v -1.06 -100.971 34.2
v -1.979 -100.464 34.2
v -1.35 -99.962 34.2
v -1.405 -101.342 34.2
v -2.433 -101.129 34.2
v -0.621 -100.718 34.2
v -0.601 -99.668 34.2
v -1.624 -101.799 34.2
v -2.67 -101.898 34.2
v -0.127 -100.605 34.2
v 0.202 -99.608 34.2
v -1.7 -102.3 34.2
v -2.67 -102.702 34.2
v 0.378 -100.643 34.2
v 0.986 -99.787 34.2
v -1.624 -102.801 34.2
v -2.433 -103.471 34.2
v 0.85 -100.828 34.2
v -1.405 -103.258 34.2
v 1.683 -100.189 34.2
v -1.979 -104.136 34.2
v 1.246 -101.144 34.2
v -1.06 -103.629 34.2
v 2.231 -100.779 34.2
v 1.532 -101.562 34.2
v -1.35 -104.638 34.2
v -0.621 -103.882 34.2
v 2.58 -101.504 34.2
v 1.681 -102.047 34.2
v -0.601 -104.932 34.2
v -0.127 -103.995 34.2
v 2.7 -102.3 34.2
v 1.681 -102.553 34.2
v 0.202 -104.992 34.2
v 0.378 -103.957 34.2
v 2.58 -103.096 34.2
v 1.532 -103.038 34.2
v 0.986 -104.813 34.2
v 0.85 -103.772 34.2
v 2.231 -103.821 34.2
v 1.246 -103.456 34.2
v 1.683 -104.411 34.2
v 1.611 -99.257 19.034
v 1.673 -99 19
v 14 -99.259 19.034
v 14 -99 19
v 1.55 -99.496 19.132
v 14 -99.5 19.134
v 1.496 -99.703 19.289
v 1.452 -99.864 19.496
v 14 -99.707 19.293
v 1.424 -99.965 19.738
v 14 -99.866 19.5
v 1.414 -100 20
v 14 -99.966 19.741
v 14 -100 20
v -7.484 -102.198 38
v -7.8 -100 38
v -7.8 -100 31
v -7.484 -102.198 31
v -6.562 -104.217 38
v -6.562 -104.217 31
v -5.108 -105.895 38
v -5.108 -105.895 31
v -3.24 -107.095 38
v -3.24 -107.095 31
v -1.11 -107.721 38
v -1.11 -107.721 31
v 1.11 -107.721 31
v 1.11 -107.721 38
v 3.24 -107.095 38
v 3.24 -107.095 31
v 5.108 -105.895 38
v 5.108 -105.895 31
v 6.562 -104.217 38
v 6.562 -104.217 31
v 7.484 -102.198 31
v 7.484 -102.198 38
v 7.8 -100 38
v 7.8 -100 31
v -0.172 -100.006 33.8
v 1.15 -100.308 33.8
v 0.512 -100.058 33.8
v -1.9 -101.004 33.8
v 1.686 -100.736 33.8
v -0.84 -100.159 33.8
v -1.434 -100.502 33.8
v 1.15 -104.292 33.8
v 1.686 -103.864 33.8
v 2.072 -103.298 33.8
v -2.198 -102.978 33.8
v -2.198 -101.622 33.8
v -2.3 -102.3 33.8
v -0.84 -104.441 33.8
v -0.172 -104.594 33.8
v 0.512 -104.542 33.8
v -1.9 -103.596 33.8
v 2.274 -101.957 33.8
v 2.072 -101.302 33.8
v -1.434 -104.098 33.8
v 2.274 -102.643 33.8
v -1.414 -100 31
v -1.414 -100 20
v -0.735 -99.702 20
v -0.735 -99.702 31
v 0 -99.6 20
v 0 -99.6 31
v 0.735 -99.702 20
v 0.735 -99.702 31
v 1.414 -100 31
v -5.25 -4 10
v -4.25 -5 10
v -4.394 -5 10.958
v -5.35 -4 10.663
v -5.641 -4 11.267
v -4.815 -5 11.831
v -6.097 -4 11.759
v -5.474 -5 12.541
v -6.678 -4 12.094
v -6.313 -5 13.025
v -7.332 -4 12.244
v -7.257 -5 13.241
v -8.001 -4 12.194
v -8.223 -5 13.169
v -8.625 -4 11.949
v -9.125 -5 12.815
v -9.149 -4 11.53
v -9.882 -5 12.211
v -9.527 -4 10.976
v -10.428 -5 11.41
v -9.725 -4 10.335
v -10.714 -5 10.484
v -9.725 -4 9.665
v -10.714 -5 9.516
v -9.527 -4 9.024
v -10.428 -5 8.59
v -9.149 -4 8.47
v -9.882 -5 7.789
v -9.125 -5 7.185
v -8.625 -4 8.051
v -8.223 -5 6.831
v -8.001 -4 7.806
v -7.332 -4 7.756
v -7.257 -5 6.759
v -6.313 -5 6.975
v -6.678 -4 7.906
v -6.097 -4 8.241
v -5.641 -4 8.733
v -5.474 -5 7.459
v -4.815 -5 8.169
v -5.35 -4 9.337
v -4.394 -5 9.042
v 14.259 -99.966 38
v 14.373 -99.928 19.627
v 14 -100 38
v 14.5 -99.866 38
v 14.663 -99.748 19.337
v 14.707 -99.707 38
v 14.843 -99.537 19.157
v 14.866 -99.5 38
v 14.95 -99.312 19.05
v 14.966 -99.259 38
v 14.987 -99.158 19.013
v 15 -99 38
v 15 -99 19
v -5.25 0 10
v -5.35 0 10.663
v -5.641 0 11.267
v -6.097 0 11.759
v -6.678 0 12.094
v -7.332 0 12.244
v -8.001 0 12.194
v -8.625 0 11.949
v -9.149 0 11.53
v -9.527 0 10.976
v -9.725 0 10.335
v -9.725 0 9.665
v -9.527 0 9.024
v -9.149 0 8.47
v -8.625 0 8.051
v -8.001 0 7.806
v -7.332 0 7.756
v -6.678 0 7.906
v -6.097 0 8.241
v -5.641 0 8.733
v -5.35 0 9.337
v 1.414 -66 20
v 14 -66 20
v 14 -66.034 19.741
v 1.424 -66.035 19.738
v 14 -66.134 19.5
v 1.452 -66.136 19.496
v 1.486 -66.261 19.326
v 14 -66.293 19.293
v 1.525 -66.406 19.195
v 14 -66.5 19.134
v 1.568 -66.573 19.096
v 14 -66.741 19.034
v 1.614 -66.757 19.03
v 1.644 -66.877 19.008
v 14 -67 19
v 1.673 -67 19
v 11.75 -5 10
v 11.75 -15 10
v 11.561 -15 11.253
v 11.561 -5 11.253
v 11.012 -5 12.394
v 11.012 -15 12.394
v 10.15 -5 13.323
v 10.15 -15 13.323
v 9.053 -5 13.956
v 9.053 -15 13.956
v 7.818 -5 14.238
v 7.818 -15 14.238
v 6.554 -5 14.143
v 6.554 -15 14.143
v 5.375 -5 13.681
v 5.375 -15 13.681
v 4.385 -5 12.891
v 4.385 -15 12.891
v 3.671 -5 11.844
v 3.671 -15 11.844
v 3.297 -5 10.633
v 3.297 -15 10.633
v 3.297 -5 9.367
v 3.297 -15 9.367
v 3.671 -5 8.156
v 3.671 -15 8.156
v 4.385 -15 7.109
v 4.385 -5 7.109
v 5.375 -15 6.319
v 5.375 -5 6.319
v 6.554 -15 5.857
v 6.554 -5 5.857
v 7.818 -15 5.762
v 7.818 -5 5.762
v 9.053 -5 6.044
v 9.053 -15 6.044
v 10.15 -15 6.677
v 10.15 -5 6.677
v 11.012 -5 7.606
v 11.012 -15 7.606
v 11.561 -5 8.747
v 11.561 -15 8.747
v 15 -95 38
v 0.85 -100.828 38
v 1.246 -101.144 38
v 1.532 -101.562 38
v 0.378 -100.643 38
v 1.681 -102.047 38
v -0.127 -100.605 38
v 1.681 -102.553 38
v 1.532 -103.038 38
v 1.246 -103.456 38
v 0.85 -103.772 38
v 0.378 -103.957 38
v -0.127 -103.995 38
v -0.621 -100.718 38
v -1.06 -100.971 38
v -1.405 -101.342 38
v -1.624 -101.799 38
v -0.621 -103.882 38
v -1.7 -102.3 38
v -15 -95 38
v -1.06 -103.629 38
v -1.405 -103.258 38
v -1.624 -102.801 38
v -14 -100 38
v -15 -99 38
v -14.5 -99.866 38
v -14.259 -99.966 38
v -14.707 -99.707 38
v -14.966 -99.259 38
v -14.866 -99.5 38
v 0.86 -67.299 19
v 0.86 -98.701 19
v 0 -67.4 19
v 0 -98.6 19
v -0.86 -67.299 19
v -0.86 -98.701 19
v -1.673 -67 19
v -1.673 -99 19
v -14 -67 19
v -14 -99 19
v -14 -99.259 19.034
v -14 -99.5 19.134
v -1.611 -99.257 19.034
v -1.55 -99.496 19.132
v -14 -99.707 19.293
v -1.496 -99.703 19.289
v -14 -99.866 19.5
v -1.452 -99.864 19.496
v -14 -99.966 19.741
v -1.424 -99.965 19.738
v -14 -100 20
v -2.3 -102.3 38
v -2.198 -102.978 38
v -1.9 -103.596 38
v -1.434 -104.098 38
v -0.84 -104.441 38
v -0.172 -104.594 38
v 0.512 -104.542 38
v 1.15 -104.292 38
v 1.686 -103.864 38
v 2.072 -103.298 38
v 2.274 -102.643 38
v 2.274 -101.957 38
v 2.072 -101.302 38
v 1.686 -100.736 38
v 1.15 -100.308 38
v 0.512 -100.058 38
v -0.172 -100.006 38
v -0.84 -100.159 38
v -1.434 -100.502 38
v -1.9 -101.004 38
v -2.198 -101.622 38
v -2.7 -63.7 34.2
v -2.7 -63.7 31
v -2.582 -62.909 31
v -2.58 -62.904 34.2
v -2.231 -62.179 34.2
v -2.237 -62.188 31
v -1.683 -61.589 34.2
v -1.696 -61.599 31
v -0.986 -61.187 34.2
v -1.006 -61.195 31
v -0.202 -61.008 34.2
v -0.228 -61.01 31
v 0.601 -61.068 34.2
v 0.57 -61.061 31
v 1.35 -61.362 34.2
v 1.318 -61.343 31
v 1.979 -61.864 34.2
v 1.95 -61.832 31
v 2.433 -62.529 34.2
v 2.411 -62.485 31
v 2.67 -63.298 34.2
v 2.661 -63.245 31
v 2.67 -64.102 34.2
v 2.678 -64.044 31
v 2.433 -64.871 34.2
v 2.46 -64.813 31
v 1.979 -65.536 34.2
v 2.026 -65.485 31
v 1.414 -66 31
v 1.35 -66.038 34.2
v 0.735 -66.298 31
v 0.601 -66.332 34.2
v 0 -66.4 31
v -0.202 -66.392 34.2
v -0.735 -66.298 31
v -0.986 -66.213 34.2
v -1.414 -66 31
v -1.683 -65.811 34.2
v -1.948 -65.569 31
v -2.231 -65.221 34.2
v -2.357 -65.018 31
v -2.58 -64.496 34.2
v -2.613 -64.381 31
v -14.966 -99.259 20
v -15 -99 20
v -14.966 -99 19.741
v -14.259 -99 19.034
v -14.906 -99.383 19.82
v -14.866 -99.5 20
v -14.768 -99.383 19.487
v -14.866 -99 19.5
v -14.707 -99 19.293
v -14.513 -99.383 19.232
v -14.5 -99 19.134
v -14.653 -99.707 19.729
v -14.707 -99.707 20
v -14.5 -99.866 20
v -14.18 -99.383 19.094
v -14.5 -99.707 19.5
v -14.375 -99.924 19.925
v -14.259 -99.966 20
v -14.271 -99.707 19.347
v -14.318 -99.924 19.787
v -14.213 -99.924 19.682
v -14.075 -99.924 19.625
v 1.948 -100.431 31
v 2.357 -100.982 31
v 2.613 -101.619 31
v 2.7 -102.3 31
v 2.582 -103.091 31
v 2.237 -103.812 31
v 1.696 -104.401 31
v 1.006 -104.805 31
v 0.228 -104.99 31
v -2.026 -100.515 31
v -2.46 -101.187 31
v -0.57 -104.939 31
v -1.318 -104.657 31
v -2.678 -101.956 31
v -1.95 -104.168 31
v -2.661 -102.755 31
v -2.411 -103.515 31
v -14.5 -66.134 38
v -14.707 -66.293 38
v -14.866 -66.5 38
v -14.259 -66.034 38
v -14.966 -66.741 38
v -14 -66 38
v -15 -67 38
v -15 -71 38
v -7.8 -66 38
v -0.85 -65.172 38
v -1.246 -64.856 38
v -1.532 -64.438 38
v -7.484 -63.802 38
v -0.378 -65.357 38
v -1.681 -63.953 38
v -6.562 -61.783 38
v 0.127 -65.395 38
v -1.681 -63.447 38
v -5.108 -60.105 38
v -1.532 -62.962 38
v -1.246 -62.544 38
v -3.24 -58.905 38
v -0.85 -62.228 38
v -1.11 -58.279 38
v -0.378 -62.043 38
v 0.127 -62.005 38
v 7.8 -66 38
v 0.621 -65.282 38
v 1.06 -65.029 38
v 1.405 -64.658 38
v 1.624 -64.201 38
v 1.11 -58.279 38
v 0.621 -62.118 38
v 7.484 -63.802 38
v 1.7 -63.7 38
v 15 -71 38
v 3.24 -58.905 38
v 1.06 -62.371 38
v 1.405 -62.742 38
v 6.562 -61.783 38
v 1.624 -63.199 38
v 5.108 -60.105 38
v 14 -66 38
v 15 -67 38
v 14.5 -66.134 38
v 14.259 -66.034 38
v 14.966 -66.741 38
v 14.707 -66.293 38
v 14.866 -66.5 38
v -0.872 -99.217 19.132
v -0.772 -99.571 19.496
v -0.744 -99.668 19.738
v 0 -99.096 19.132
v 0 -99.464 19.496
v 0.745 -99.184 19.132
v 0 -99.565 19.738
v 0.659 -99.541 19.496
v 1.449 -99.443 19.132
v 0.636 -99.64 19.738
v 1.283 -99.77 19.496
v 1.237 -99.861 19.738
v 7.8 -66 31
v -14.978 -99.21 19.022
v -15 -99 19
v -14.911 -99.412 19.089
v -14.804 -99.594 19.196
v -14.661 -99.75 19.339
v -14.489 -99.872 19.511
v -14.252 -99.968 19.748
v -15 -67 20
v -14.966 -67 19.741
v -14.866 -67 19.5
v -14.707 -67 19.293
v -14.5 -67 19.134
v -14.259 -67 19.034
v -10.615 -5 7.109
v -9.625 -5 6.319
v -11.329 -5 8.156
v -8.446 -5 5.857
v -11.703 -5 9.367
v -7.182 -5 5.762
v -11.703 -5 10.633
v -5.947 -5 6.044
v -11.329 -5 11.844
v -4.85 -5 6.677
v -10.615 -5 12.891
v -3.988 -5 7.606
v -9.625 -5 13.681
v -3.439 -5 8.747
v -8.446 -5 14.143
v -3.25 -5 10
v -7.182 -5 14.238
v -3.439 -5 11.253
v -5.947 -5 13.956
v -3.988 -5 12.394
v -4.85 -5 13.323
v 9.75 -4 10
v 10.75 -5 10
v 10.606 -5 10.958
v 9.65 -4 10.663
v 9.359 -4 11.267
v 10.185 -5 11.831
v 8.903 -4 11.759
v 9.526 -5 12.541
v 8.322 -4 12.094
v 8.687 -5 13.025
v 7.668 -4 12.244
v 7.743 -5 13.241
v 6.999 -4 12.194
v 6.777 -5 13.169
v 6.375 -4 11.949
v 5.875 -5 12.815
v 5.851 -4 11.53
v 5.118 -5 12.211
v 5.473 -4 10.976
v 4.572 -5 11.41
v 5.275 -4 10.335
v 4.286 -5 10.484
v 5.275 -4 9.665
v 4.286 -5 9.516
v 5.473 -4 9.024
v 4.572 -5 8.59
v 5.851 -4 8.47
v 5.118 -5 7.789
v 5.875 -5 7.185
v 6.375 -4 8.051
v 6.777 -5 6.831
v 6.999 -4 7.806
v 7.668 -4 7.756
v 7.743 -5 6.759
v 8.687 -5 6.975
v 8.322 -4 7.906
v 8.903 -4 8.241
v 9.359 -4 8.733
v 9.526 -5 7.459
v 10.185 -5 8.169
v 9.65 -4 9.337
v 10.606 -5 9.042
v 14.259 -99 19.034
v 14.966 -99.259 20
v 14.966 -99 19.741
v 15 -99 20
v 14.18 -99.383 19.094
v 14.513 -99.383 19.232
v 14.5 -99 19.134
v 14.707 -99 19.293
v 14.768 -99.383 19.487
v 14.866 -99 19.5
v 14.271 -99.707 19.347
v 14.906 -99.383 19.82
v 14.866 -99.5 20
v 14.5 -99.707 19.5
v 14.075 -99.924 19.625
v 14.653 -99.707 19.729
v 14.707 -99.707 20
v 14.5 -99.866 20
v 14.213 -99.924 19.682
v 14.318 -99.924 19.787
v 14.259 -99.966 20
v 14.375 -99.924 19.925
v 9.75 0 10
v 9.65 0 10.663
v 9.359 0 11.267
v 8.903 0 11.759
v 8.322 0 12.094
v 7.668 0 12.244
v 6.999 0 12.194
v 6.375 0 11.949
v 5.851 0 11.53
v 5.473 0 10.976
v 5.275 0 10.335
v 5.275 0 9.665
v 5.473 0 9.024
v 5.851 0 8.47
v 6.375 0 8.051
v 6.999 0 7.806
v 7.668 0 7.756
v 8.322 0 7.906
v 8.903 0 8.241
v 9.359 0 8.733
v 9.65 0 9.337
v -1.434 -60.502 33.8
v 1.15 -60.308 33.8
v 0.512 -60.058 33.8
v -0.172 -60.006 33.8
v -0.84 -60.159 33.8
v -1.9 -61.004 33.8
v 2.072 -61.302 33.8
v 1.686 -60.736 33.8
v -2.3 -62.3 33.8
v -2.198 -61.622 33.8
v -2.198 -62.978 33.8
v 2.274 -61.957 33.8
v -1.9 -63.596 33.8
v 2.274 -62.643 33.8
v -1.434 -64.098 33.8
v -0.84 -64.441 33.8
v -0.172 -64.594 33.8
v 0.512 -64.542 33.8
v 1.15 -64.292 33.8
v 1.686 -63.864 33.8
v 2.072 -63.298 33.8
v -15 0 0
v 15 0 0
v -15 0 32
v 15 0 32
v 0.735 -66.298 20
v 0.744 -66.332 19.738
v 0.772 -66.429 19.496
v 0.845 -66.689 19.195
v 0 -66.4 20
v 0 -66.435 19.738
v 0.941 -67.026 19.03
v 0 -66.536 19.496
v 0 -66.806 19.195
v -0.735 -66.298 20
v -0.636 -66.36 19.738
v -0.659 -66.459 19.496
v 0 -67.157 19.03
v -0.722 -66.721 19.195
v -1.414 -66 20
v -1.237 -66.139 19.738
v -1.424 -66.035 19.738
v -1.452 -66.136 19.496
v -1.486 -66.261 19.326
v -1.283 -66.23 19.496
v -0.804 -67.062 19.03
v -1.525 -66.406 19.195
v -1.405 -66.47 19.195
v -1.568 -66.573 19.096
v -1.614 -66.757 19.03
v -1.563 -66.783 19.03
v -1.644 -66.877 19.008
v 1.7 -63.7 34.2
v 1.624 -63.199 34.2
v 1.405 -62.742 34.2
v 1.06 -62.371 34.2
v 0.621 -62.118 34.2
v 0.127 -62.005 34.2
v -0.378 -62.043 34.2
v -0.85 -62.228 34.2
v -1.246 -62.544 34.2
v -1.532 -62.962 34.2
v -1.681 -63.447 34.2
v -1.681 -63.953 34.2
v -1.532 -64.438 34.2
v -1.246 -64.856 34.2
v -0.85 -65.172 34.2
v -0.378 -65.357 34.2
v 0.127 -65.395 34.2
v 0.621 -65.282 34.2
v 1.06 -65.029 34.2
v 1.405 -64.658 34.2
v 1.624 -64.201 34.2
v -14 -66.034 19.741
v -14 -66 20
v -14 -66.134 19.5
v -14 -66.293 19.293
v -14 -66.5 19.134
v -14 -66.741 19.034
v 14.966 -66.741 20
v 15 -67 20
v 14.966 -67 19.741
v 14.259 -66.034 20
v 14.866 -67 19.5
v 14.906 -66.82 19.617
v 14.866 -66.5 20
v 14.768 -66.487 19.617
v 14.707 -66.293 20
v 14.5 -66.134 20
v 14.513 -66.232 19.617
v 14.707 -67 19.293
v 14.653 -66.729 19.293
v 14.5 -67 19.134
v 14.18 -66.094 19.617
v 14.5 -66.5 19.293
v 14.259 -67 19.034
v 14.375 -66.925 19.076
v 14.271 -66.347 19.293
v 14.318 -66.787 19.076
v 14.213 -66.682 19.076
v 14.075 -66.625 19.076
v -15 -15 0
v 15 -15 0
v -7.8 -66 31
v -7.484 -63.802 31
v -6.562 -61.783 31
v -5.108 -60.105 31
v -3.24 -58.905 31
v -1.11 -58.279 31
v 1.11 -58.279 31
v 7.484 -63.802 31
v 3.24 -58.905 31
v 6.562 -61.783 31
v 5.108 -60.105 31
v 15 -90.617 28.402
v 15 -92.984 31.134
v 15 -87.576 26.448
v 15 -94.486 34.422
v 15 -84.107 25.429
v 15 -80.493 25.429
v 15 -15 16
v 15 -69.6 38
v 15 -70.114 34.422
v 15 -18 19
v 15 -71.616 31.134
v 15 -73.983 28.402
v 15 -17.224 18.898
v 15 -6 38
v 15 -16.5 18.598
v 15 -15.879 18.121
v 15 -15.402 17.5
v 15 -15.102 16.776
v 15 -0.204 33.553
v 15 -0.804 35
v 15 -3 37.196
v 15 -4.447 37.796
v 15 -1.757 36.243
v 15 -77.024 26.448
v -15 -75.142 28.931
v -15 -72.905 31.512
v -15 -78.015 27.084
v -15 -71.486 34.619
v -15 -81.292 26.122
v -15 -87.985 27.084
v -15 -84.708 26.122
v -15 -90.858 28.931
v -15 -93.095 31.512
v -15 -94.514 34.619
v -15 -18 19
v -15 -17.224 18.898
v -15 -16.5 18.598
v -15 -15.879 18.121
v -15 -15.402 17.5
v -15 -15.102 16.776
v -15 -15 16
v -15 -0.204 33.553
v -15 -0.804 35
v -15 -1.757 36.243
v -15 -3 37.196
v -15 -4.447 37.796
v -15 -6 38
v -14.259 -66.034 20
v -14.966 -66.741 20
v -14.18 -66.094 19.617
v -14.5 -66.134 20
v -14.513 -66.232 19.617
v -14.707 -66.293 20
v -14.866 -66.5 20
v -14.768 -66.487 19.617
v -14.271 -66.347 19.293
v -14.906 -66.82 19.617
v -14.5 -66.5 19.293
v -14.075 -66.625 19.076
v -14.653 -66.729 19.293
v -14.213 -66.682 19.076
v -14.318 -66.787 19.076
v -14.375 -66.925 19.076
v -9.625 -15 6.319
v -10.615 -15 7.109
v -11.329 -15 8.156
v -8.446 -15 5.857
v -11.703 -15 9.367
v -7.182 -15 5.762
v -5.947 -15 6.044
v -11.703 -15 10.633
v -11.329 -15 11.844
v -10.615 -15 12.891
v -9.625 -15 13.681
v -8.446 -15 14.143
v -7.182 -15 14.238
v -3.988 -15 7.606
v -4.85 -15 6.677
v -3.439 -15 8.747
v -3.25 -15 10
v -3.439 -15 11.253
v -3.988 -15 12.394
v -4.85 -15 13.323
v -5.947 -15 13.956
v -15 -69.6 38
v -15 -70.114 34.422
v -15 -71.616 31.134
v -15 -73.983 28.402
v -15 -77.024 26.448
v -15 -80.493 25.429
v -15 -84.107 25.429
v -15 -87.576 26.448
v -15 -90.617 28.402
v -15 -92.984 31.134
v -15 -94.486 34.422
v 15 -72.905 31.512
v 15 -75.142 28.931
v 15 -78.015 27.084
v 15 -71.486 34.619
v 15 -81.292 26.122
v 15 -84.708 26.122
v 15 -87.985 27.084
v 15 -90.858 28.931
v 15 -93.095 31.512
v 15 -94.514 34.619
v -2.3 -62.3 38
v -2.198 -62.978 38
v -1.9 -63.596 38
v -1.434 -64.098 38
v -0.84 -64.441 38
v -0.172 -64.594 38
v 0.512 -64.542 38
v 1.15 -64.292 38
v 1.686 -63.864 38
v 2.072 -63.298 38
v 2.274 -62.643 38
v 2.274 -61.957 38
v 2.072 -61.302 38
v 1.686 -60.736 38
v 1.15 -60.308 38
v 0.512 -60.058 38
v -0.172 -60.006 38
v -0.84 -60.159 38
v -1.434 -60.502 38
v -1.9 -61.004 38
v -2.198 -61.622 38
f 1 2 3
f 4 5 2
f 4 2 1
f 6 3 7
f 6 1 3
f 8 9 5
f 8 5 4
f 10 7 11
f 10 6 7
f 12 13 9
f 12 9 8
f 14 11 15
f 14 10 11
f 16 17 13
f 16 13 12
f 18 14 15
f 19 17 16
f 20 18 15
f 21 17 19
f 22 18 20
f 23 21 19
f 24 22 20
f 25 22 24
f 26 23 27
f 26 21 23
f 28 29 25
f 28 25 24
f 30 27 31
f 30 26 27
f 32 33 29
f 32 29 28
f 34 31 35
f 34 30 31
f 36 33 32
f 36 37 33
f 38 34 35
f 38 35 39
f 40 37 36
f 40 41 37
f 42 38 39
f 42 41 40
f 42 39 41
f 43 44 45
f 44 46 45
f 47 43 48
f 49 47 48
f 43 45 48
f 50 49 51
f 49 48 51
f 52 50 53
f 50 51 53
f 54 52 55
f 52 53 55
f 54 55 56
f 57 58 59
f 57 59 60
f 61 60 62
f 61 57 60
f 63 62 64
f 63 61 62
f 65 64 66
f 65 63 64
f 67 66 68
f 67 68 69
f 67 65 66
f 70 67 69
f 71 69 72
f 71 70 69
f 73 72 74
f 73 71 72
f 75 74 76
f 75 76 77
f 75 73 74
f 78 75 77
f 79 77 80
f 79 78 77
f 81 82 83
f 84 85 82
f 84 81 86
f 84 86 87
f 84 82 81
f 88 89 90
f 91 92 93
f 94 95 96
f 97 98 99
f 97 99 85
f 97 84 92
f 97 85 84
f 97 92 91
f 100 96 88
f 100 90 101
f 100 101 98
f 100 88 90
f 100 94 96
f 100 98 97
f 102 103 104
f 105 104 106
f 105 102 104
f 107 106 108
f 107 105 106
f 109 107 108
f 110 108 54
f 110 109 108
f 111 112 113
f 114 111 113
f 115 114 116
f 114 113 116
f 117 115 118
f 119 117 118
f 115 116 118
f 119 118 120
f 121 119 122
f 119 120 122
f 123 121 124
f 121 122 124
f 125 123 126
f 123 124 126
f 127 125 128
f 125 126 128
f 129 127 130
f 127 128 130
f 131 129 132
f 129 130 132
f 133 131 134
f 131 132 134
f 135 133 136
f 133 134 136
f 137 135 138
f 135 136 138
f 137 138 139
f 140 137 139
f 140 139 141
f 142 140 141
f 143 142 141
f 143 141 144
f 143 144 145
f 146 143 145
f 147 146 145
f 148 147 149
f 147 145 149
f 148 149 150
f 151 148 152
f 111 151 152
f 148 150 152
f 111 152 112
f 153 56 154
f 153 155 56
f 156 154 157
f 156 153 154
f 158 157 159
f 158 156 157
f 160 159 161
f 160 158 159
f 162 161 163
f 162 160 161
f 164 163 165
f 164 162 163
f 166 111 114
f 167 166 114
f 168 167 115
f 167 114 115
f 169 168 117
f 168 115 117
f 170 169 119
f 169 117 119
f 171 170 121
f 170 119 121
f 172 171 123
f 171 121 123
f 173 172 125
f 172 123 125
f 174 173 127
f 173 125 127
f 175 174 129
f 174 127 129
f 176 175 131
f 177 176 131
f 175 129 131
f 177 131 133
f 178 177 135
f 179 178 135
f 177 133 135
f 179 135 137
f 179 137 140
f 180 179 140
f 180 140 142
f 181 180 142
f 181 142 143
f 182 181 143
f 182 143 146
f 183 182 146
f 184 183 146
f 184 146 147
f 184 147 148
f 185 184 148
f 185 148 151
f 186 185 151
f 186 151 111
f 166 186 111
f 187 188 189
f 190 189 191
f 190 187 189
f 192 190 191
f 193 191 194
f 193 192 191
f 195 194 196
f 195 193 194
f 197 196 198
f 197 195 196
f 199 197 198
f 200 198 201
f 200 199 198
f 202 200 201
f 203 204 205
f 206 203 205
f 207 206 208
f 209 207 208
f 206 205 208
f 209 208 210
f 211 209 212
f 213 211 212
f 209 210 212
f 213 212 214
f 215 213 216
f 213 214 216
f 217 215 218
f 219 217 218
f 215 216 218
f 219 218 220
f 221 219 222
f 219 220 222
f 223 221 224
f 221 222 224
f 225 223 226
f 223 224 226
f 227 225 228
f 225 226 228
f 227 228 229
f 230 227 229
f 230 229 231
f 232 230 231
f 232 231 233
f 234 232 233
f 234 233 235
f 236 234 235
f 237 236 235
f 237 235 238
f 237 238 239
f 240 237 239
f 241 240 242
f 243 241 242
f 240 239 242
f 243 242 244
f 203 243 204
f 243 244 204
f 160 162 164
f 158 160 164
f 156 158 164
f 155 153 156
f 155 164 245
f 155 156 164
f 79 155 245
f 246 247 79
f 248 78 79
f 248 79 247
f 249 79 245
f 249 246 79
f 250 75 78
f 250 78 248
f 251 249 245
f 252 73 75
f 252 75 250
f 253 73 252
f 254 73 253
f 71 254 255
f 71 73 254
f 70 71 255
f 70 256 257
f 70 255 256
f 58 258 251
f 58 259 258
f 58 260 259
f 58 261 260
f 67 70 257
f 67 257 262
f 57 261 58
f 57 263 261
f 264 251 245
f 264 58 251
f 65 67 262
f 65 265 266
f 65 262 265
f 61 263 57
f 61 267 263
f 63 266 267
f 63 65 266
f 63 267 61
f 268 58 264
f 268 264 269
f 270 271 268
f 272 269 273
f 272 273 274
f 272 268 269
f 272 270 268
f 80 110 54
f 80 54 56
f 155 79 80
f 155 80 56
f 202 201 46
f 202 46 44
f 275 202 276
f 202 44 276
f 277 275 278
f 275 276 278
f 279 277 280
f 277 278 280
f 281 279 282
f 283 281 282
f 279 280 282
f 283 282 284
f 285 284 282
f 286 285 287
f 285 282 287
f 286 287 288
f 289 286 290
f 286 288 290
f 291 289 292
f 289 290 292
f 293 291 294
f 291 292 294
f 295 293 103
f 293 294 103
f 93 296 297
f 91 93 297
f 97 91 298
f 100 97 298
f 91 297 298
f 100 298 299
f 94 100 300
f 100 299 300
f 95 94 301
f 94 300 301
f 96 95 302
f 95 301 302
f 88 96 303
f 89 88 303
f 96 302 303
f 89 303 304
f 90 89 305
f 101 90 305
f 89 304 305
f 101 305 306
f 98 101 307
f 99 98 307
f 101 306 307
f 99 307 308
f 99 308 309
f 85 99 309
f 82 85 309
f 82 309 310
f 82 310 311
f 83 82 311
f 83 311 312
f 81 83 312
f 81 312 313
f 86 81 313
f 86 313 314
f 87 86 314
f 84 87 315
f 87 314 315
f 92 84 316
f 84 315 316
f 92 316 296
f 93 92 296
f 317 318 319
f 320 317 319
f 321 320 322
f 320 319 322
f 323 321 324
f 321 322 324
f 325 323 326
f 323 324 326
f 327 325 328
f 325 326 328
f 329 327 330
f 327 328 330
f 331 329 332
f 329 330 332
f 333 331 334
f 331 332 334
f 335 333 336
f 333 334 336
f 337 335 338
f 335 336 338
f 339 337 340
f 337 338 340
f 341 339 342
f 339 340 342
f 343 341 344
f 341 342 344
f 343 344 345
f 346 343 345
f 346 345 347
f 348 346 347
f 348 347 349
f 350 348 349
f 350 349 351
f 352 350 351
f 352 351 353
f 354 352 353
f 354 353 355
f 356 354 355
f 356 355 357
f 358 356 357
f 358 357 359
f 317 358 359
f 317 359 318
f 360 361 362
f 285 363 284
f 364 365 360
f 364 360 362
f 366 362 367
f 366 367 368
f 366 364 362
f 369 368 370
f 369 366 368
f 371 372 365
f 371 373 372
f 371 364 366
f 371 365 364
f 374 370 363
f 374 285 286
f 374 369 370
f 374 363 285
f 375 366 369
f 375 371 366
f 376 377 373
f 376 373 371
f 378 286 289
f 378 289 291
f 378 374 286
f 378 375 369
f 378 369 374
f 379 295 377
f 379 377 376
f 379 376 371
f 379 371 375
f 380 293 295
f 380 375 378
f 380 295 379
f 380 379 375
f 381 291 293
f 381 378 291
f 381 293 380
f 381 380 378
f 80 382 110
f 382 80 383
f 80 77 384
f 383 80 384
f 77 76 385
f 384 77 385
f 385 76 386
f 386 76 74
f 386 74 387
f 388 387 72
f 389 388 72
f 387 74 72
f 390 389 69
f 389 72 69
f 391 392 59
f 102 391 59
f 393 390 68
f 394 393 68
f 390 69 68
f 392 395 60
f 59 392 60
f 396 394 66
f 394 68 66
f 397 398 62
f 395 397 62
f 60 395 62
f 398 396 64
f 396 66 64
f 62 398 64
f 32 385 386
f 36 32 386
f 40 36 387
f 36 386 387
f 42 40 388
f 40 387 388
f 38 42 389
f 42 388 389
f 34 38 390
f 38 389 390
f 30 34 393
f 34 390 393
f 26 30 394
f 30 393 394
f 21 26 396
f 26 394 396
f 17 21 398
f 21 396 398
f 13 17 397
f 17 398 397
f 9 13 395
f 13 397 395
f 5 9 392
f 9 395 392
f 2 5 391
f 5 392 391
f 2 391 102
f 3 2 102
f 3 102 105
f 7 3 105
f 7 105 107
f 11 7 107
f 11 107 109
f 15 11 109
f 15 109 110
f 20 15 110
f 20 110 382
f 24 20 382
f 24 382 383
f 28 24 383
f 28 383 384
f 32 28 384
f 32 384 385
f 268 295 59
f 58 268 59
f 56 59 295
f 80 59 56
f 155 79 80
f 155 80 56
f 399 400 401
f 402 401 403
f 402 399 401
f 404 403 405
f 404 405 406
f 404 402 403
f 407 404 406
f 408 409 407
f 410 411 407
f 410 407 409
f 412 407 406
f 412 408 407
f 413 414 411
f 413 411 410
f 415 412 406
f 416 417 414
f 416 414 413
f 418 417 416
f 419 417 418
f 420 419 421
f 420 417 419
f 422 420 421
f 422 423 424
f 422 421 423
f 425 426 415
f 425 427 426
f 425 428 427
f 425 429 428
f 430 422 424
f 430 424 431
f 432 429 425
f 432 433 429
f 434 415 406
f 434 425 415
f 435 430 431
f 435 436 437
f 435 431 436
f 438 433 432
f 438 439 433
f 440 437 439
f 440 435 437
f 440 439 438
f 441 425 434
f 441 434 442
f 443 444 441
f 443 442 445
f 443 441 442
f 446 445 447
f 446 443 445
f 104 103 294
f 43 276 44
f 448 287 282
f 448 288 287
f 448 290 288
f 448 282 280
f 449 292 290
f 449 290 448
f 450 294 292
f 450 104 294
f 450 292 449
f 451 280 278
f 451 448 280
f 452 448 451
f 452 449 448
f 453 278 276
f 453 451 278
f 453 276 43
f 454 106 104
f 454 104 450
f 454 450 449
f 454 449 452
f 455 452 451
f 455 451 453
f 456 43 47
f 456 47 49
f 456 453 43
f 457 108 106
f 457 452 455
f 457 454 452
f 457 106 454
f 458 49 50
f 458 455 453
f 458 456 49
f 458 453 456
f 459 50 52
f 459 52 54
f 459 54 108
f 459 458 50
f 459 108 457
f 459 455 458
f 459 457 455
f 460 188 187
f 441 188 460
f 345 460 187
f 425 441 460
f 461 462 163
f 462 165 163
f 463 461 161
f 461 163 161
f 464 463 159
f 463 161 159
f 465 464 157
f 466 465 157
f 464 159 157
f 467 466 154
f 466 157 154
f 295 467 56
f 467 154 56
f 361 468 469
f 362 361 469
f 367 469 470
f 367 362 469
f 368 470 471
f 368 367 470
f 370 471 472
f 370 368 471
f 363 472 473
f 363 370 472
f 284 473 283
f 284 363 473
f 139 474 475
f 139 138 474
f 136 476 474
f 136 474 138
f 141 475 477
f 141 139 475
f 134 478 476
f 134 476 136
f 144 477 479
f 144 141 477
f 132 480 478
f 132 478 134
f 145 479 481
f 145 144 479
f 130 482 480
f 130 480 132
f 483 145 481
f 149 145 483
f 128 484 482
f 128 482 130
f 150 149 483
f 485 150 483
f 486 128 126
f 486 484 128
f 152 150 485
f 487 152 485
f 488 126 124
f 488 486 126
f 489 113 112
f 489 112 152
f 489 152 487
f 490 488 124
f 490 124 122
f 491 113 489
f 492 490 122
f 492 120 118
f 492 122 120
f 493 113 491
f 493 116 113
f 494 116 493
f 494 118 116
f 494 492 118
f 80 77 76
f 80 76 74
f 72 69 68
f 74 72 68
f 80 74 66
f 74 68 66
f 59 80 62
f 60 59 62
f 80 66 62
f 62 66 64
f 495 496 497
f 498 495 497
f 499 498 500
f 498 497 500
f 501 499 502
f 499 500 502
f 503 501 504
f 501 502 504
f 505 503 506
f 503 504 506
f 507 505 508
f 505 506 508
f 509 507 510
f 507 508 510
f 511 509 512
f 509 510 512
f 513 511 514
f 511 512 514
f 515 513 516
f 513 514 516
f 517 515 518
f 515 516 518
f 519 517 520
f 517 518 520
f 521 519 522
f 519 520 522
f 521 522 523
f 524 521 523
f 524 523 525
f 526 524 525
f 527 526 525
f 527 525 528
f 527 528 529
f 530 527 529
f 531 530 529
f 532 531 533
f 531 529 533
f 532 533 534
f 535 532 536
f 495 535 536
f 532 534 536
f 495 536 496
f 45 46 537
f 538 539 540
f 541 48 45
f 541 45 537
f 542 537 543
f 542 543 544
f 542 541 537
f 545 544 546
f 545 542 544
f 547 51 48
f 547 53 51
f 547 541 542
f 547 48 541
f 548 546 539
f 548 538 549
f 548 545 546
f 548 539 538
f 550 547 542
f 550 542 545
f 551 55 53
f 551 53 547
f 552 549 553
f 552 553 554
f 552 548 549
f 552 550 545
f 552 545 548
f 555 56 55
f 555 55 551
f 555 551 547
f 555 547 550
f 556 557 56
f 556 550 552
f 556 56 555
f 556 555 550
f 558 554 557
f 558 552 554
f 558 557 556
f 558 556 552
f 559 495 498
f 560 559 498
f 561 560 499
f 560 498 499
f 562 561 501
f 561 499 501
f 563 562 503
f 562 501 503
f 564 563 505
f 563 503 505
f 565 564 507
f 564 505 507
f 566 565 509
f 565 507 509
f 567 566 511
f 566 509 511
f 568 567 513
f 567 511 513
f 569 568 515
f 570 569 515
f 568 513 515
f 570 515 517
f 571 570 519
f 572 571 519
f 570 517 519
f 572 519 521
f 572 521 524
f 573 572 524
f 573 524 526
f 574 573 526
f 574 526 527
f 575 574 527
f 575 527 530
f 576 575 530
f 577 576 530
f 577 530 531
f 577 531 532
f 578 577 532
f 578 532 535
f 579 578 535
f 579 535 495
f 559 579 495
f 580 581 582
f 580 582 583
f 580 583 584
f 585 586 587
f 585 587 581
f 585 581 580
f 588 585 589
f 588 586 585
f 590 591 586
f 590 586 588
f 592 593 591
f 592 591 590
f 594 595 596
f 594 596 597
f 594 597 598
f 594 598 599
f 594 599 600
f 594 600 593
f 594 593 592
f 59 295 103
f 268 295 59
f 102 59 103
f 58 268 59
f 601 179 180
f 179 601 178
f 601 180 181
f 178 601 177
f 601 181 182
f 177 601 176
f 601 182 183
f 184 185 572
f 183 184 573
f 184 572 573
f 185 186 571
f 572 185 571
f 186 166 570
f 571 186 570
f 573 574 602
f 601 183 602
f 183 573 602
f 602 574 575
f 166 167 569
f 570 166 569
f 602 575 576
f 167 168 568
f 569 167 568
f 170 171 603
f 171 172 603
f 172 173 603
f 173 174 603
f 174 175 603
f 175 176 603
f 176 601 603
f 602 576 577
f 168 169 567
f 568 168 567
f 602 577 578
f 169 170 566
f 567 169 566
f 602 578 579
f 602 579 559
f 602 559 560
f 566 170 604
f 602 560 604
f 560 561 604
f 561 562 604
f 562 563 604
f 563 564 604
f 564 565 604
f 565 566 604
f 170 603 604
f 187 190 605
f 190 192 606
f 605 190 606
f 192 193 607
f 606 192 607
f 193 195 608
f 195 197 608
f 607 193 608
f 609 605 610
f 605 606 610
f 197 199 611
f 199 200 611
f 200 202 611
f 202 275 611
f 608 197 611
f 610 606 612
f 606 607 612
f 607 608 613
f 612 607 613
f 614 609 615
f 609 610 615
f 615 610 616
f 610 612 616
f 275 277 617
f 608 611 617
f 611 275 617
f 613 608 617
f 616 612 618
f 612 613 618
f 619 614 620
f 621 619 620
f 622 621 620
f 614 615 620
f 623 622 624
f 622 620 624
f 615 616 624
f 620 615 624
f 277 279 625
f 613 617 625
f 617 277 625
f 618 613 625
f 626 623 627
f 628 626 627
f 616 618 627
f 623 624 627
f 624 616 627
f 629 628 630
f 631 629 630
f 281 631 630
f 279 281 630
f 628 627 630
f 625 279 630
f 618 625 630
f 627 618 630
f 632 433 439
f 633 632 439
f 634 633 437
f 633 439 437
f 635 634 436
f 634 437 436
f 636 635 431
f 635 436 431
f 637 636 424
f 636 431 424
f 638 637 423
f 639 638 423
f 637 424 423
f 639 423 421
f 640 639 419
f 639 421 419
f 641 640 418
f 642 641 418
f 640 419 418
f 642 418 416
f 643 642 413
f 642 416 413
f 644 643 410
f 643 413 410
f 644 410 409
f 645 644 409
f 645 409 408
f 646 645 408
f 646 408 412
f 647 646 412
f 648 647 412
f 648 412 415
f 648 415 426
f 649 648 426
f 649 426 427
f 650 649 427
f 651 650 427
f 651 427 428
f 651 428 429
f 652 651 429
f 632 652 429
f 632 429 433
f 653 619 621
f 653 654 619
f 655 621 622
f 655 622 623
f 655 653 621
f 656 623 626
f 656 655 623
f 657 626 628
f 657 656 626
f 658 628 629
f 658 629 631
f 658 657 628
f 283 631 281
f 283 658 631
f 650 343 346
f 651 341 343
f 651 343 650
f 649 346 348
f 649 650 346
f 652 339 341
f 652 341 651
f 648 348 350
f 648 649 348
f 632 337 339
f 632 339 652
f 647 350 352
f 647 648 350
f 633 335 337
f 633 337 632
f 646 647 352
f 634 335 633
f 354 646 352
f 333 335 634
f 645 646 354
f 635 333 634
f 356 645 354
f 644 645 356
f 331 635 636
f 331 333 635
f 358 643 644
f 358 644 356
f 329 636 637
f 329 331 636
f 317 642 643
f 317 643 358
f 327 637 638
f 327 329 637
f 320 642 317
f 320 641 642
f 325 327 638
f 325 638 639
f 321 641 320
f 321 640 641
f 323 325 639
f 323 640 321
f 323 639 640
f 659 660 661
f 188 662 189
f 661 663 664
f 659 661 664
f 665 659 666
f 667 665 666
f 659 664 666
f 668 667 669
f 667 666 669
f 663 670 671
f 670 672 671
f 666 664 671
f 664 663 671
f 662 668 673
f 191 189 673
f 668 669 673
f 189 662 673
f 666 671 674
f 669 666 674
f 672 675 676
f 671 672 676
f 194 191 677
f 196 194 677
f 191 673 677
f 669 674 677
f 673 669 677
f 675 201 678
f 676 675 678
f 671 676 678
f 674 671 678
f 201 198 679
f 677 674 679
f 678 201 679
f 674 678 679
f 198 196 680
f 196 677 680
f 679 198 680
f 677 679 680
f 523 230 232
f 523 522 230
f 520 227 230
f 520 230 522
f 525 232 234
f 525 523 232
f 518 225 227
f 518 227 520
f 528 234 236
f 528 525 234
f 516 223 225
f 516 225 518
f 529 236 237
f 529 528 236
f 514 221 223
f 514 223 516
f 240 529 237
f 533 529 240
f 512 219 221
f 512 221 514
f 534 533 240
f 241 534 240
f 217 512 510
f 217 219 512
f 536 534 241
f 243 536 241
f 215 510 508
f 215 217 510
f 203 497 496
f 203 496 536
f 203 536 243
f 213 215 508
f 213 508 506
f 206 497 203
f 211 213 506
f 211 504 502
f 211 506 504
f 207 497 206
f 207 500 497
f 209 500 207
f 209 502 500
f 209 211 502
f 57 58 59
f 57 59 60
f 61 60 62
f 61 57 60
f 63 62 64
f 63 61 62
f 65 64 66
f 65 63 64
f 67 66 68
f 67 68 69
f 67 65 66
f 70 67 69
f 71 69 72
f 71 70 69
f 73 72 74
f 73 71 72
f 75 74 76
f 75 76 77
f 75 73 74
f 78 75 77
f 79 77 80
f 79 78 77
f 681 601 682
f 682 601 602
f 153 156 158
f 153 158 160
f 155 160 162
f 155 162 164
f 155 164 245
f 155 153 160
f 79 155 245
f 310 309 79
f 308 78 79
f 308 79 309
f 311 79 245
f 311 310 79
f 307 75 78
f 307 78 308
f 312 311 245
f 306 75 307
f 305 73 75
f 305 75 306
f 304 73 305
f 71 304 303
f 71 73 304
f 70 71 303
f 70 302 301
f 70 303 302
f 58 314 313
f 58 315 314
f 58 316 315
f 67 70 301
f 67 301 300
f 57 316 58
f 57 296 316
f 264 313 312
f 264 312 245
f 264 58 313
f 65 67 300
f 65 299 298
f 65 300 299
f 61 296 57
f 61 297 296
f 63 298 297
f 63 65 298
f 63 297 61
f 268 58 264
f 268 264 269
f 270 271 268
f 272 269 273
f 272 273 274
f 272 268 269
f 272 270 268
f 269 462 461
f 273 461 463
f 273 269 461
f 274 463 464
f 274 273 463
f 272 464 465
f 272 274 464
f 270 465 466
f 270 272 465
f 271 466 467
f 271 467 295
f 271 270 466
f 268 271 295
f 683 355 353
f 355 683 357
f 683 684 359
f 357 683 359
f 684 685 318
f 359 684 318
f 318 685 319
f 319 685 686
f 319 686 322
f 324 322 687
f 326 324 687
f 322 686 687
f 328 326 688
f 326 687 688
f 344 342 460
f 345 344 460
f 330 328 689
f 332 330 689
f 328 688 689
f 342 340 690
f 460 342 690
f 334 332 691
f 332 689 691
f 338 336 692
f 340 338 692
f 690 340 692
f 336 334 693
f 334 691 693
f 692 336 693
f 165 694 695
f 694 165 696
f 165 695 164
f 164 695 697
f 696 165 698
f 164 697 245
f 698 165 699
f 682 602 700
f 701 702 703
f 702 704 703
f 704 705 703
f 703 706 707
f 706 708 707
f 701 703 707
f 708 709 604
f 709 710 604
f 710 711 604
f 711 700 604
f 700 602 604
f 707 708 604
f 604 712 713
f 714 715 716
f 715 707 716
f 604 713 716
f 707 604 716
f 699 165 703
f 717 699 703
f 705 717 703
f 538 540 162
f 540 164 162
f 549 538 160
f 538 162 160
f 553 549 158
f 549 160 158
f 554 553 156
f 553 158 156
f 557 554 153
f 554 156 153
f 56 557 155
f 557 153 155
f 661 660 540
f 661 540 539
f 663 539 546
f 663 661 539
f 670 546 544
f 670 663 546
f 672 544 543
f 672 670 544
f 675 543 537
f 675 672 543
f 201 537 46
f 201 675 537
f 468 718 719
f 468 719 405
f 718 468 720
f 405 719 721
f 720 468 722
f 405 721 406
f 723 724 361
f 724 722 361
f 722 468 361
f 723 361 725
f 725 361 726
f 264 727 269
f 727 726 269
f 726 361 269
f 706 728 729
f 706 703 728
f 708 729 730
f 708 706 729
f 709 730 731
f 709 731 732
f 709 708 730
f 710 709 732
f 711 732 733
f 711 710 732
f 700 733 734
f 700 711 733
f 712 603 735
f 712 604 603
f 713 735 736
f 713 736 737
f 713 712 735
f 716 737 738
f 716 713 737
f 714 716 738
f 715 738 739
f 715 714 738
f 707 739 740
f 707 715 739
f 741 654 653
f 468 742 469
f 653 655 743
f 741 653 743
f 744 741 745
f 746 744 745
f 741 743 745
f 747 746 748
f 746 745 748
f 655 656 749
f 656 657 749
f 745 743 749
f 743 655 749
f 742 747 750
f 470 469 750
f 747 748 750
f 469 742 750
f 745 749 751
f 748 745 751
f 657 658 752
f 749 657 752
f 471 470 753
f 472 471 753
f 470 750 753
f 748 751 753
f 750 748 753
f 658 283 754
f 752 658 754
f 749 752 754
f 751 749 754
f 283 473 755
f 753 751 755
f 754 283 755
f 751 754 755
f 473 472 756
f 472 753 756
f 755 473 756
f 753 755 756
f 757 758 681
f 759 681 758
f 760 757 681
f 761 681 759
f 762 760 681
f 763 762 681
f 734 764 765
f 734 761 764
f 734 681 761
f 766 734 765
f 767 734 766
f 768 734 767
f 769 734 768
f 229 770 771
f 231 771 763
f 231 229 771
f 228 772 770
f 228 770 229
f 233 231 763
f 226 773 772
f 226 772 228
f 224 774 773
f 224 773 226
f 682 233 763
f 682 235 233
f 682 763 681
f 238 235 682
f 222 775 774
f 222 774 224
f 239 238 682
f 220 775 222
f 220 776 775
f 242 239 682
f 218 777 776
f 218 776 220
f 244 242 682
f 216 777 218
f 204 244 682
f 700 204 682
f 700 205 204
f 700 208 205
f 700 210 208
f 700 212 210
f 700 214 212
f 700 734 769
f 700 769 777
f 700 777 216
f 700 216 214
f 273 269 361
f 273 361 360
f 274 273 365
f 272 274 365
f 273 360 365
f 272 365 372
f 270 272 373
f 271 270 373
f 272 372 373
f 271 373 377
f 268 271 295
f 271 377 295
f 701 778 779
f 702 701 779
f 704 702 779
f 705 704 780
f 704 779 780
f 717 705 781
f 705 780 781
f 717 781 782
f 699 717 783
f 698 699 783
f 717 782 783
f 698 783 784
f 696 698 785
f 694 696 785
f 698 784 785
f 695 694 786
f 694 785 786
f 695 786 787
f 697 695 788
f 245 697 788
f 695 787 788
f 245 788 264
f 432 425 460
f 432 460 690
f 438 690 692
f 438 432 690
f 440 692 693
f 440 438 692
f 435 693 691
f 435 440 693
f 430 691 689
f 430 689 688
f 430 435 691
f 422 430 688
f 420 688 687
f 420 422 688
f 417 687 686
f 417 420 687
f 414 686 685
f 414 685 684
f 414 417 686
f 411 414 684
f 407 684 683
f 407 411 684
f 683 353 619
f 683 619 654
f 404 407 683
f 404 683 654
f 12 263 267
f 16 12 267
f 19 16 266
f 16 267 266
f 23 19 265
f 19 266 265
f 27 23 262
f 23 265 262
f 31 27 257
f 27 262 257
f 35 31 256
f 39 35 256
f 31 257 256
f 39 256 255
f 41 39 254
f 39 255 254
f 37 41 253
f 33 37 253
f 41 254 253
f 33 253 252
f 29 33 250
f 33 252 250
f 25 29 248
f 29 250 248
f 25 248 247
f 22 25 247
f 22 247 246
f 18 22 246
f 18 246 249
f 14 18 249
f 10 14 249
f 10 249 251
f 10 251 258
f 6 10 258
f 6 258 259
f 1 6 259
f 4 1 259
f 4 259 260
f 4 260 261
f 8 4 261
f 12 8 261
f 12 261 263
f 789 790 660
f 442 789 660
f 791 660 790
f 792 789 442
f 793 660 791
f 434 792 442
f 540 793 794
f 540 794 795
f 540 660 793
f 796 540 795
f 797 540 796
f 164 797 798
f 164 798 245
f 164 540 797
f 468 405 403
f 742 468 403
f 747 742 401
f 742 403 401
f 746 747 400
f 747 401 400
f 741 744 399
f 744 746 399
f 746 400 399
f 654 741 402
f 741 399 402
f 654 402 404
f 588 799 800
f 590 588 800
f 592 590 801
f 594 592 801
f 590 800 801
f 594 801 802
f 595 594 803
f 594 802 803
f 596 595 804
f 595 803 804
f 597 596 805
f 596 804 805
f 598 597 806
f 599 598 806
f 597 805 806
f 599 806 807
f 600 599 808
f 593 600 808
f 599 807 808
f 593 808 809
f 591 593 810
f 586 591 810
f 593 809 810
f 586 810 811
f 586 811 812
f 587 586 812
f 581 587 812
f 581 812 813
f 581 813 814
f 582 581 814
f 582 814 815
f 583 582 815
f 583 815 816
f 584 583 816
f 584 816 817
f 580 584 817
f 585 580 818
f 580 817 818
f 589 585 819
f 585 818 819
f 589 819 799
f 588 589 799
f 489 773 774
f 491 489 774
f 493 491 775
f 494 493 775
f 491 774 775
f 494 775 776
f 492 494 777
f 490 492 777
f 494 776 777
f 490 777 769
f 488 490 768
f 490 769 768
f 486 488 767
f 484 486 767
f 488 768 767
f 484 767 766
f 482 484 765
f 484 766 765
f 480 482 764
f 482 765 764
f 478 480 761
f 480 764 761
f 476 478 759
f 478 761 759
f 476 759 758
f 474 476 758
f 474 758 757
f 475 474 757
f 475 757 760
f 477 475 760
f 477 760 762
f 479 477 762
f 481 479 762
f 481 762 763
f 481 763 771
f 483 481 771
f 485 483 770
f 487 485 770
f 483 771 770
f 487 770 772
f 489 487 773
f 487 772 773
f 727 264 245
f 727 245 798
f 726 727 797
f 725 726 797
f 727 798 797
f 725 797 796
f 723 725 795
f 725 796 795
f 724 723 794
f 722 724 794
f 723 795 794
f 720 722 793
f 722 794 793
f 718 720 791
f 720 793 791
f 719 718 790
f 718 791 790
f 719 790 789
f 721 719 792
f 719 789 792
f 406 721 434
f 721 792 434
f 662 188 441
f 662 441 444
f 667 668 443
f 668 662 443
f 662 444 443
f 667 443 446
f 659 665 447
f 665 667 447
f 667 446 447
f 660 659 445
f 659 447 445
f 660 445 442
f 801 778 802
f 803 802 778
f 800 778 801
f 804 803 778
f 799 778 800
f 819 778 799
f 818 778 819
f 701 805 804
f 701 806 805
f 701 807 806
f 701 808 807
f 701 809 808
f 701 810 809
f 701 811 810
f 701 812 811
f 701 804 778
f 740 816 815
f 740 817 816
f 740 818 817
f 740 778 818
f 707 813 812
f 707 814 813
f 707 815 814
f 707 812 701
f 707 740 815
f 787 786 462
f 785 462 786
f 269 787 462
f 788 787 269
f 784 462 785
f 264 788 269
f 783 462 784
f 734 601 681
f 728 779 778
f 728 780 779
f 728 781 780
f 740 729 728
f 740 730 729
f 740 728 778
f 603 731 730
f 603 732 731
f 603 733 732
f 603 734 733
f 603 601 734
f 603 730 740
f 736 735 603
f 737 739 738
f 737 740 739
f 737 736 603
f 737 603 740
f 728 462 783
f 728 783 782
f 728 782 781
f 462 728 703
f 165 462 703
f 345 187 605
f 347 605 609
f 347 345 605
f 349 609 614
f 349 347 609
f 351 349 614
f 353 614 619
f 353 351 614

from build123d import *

# Parameters (mm, degrees)
SKETCH_W               = 30
SKETCH_H               = 38
PAD_DEPTH              = 15
SKETCH001_W            = 30
SKETCH001_H            = 19
PAD001_DEPTH           = 85
POCKET_DEPTH           = 30.001
SKETCH004_R            = 2.25
POCKET001_DEPTH        = 15.001
SKETCH005_R            = 4.25
POCKET002_DEPTH        = 10
PAD002_DEPTH           = 7
SKETCH007_R            = 2.3
POCKET003_DEPTH        = 4.2
SKETCH008_R            = 2.3
POCKET004_DEPTH        = 4.2
FILLET_R               = 3
FILLET014_R            = 6
FILLET015_R            = 1
CHAMFER_SIZE           = 1
BOX001_W               = 30
BOX001_H               = 83
BOX001_DEPTH           = 38
SKETCH017_W            = 30
SKETCH017_H            = 38
PAD006_DEPTH           = 15
SKETCH018_W            = 30
SKETCH018_H            = 19
PAD007_DEPTH           = 85
POCKET010_DEPTH        = 30.001
SKETCH020_R            = 2.25
POCKET011_DEPTH        = 15.001
SKETCH021_R            = 4.25
POCKET012_DEPTH        = 10
PAD008_DEPTH           = 7
SKETCH023_R            = 2.7
POCKET013_DEPTH        = 3.2
POCKET013_DEPTH_BACK   = -12
SKETCH024_R            = 1.7
POCKET014_DEPTH        = 38.001
CUT001_PLACEMENT_ANGLE = 180
BOX_W                  = 30
BOX_H                  = 83
BOX_DEPTH              = 38
SKETCH009_W            = 30
SKETCH009_H            = 38
PAD003_DEPTH           = 15
SKETCH010_W            = 30
SKETCH010_H            = 19
PAD004_DEPTH           = 85
POCKET005_DEPTH        = 30.001
SKETCH012_R            = 2.25
POCKET006_DEPTH        = 15.001
SKETCH013_R            = 4.25
POCKET007_DEPTH        = 10
PAD005_DEPTH           = 7
SKETCH015_R            = 2.7
POCKET008_DEPTH        = 3.2
POCKET008_DEPTH_BACK   = -12
SKETCH016_R            = 1.7
POCKET009_DEPTH        = 38.001
FILLET016_R            = 1
FILLET017_R            = 1
FILLET018_R            = 1


with BuildPart() as bracket:
    # Sketch → Pad (new body)
    with BuildSketch(Plane.XZ):
        with Locations((0, 19)):
            Rectangle(SKETCH_W, SKETCH_H)
    extrude(amount=PAD_DEPTH)

    # Sketch001 (on Face6 of Pad) → Pad001 (join)
    with BuildSketch(Plane.XZ.offset(15)):
        with Locations((0, 28.5)):
            Rectangle(SKETCH001_W, SKETCH001_H)
    extrude(amount=PAD001_DEPTH)

    # Sketch003 (on Face6 of Pad001) → Pocket (cut, through all)
    with BuildSketch(Plane(origin=(-15, 0, 0), x_dir=(0, 0, -1), z_dir=(-1, 0, 0))):
        with BuildLine():
            ThreePointArc((-38, 69.6), (-25.3, 82.3), (-38, 95))
            Line((-38, 69.6), (-38, 95))
        make_face()
    extrude(amount=-POCKET_DEPTH, mode=Mode.SUBTRACT)

    # Sketch004 (on Face5 of Pocket) → Pocket001 (cut, through all)
    with BuildSketch(Plane.XZ.offset(15)):
        with Locations((-7.5, 10)):
            Circle(SKETCH004_R)
        with Locations((7.5, 10)):
            Circle(SKETCH004_R)
    extrude(amount=-POCKET001_DEPTH, mode=Mode.SUBTRACT)

    # Sketch005 (on Face5 of Pocket001) → Pocket002 (cut)
    with BuildSketch(Plane.XZ.offset(15)):
        with Locations((-7.5, 10)):
            Circle(SKETCH005_R)
        with Locations((7.5, 10)):
            Circle(SKETCH005_R)
    extrude(amount=-POCKET002_DEPTH, mode=Mode.SUBTRACT)

    # Sketch006 (on Face8 of Pocket002) → Pad002 (join)
    with BuildSketch(Plane(origin=(0, 0, 38), x_dir=(-1, 0, 0), z_dir=(0, 0, 1))):
        with BuildLine():
            ThreePointArc((7.8, 100), (-1e-06, 107.8), (-7.8, 99.999997))
            Line((-7.8, 99.999997), (7.8, 100))
        make_face()
    extrude(amount=-PAD002_DEPTH)

    # Sketch007 (on Face18 of Pad002) → Pocket003 (cut)
    with BuildSketch(Plane(origin=(0, 0, 38), x_dir=(-1, 0, 0), z_dir=(0, 0, 1))):
        with Locations((0, 102.3)):
            Circle(SKETCH007_R)
    extrude(amount=-POCKET003_DEPTH, mode=Mode.SUBTRACT)

    # Sketch008 (on Face6 of Pocket003) → Pocket004 (cut)
    with BuildSketch(Plane(origin=(0, 0, 38), x_dir=(-1, 0, 0), z_dir=(0, 0, 1))):
        with Locations((0, 62.3)):
            Circle(SKETCH008_R)
    extrude(amount=-POCKET004_DEPTH, mode=Mode.SUBTRACT)

    # Fillet
    fillet_edges = [bracket.edges().sort_by_distance(p)[0] for p in [
        (0, -15, 19),
    ]]
    fillet(fillet_edges, radius=FILLET_R)

    # Fillet014
    fillet014_edges = [bracket.edges().sort_by_distance(p)[0] for p in [
        (0, 0, 38),
    ]]
    fillet(fillet014_edges, radius=FILLET014_R)

    # Fillet015
    fillet015_edges = [bracket.edges().sort_by_distance(p)[0] for p in [
        (15, -100, 28.5),
        (-15, -100, 28.5),
        (0, -100, 19),
    ]]
    fillet(fillet015_edges, radius=FILLET015_R)

    # Chamfer
    chamfer_edges = [bracket.edges().sort_by_distance(p)[0] for p in [
        (-9.75, -5, 10),
        (5.25, -5, 10),
    ]]
    chamfer(chamfer_edges, length=CHAMFER_SIZE)


with BuildPart() as cube001:
    # Box001 → Box001 (new body)
    with BuildSketch(Plane(origin=(-15, -83, 0), x_dir=(1, 0, 0), z_dir=(0, 0, 1))):
        with Locations((15, 41.5)):
            Rectangle(BOX001_W, BOX001_H)
    extrude(amount=BOX001_DEPTH)


with BuildPart() as cut001:
    # Sketch017 → Pad006 (new body)
    with BuildSketch(Plane.XZ):
        with Locations((0, 19)):
            Rectangle(SKETCH017_W, SKETCH017_H)
    extrude(amount=PAD006_DEPTH)

    # Sketch018 (on Face6 of Pad006) → Pad007 (join)
    with BuildSketch(Plane.XZ.offset(15)):
        with Locations((0, 28.5)):
            Rectangle(SKETCH018_W, SKETCH018_H)
    extrude(amount=PAD007_DEPTH)

    # Sketch019 (on Face6 of Pad007) → Pocket010 (cut, through all)
    with BuildSketch(Plane(origin=(-15, 0, 0), x_dir=(0, 0, -1), z_dir=(-1, 0, 0))):
        with BuildLine():
            ThreePointArc((-38, 71), (-26, 83), (-38, 95))
            Line((-38, 71), (-38, 95))
        make_face()
    extrude(amount=-POCKET010_DEPTH, mode=Mode.SUBTRACT)

    # Sketch020 (on Face5 of Pocket010) → Pocket011 (cut, through all)
    with BuildSketch(Plane.XZ.offset(15)):
        with Locations((-7.5, 10)):
            Circle(SKETCH020_R)
        with Locations((7.5, 10)):
            Circle(SKETCH020_R)
    extrude(amount=-POCKET011_DEPTH, mode=Mode.SUBTRACT)

    # Sketch021 (on Face5 of Pocket011) → Pocket012 (cut)
    with BuildSketch(Plane.XZ.offset(15)):
        with Locations((-7.5, 10)):
            Circle(SKETCH021_R)
        with Locations((7.5, 10)):
            Circle(SKETCH021_R)
    extrude(amount=-POCKET012_DEPTH, mode=Mode.SUBTRACT)

    # Sketch022 (on Face8 of Pocket012) → Pad008 (join)
    with BuildSketch(Plane(origin=(0, 0, 38), x_dir=(-1, 0, 0), z_dir=(0, 0, 1))):
        with BuildLine():
            ThreePointArc((7.8, 100), (-1e-06, 107.8), (-7.8, 99.999997))
            Line((-7.8, 99.999997), (7.8, 100))
        make_face()
    extrude(amount=-PAD008_DEPTH)

    # Sketch023 (on Face15 of Pad008) → Pocket013 (cut, two sides)
    with BuildSketch(Plane(origin=(0, 0, 31), x_dir=(1, 0, 0), z_dir=(0, 0, -1))) as pocket013_sk:
        with Locations((0, 102.3)):
            Circle(SKETCH023_R)
    extrude(amount=-POCKET013_DEPTH, mode=Mode.SUBTRACT)
    extrude(pocket013_sk.sketch, amount=-POCKET013_DEPTH_BACK, mode=Mode.SUBTRACT)

    # Sketch024 (on Face8 of Pocket013) → Pocket014 (cut, through all)
    with BuildSketch(Plane(origin=(0, 0, 38), x_dir=(-1, 0, 0), z_dir=(0, 0, 1))):
        with Locations((0, 102.3)):
            Circle(SKETCH024_R)
    extrude(amount=-POCKET014_DEPTH, mode=Mode.SUBTRACT)

    # Cut001: cut Cube001
    add(cube001.part, mode=Mode.SUBTRACT)


with BuildPart() as cut001_1:
    # Cut001 placement: moved
    add(cut001.part.moved(Location((0, -166, 0))).rotate(Axis((0, -166, 0), (0, 0, 1)), CUT001_PLACEMENT_ANGLE))


with BuildPart() as cube:
    # Box → Box (new body)
    with BuildSketch(Plane(origin=(-15, -83, 0), x_dir=(1, 0, 0), z_dir=(0, 0, 1))):
        with Locations((15, 41.5)):
            Rectangle(BOX_W, BOX_H)
    extrude(amount=BOX_DEPTH)


with BuildPart() as clamp001:
    # Sketch009 → Pad003 (new body)
    with BuildSketch(Plane.XZ):
        with Locations((0, 19)):
            Rectangle(SKETCH009_W, SKETCH009_H)
    extrude(amount=PAD003_DEPTH)

    # Sketch010 (on Face6 of Pad003) → Pad004 (join)
    with BuildSketch(Plane.XZ.offset(15)):
        with Locations((0, 28.5)):
            Rectangle(SKETCH010_W, SKETCH010_H)
    extrude(amount=PAD004_DEPTH)

    # Sketch011 (on Face6 of Pad004) → Pocket005 (cut, through all)
    with BuildSketch(Plane(origin=(-15, 0, 0), x_dir=(0, 0, -1), z_dir=(-1, 0, 0))):
        with BuildLine():
            ThreePointArc((-38, 71), (-26, 83), (-38, 95))
            Line((-38, 71), (-38, 95))
        make_face()
    extrude(amount=-POCKET005_DEPTH, mode=Mode.SUBTRACT)

    # Sketch012 (on Face5 of Pocket005) → Pocket006 (cut, through all)
    with BuildSketch(Plane.XZ.offset(15)):
        with Locations((-7.5, 10)):
            Circle(SKETCH012_R)
        with Locations((7.5, 10)):
            Circle(SKETCH012_R)
    extrude(amount=-POCKET006_DEPTH, mode=Mode.SUBTRACT)

    # Sketch013 (on Face5 of Pocket006) → Pocket007 (cut)
    with BuildSketch(Plane.XZ.offset(15)):
        with Locations((-7.5, 10)):
            Circle(SKETCH013_R)
        with Locations((7.5, 10)):
            Circle(SKETCH013_R)
    extrude(amount=-POCKET007_DEPTH, mode=Mode.SUBTRACT)

    # Sketch014 (on Face8 of Pocket007) → Pad005 (join)
    with BuildSketch(Plane(origin=(0, 0, 38), x_dir=(-1, 0, 0), z_dir=(0, 0, 1))):
        with BuildLine():
            ThreePointArc((7.8, 100), (-1e-06, 107.8), (-7.8, 99.999997))
            Line((-7.8, 99.999997), (7.8, 100))
        make_face()
    extrude(amount=-PAD005_DEPTH)

    # Sketch015 (on Face15 of Pad005) → Pocket008 (cut, two sides)
    with BuildSketch(Plane(origin=(0, 0, 31), x_dir=(1, 0, 0), z_dir=(0, 0, -1))) as pocket008_sk:
        with Locations((0, 102.3)):
            Circle(SKETCH015_R)
    extrude(amount=-POCKET008_DEPTH, mode=Mode.SUBTRACT)
    extrude(pocket008_sk.sketch, amount=-POCKET008_DEPTH_BACK, mode=Mode.SUBTRACT)

    # Sketch016 (on Face8 of Pocket008) → Pocket009 (cut, through all)
    with BuildSketch(Plane(origin=(0, 0, 38), x_dir=(-1, 0, 0), z_dir=(0, 0, 1))):
        with Locations((0, 102.3)):
            Circle(SKETCH016_R)
    extrude(amount=-POCKET009_DEPTH, mode=Mode.SUBTRACT)

    # Cut: cut Cube
    add(cube.part, mode=Mode.SUBTRACT)

    # Fusion: union Cut001
    add(cut001_1.part)

    # Fillet016
    fillet016_edges = [clamp001.edges().sort_by_distance(p)[0] for p in [
        (15, -66, 28.5),
        (-15, -66, 28.5),
    ]]
    fillet(fillet016_edges, radius=FILLET016_R)

    # Fillet017
    fillet017_edges = [clamp001.edges().sort_by_distance(p)[0] for p in [
        (-7.707107, -66, 19),
        (0, -66.4, 19),
        (7.707107, -66, 19),
    ]]
    fillet(fillet017_edges, radius=FILLET017_R)

    # Fillet018
    fillet018_edges = [clamp001.edges().sort_by_distance(p)[0] for p in [
        (7.707107, -100, 19),
        (-7.707107, -100, 19),
        (0, -99.6, 19),
    ]]
    fillet(fillet018_edges, radius=FILLET018_R)


solid = Compound([bracket.part, clamp001.part])
